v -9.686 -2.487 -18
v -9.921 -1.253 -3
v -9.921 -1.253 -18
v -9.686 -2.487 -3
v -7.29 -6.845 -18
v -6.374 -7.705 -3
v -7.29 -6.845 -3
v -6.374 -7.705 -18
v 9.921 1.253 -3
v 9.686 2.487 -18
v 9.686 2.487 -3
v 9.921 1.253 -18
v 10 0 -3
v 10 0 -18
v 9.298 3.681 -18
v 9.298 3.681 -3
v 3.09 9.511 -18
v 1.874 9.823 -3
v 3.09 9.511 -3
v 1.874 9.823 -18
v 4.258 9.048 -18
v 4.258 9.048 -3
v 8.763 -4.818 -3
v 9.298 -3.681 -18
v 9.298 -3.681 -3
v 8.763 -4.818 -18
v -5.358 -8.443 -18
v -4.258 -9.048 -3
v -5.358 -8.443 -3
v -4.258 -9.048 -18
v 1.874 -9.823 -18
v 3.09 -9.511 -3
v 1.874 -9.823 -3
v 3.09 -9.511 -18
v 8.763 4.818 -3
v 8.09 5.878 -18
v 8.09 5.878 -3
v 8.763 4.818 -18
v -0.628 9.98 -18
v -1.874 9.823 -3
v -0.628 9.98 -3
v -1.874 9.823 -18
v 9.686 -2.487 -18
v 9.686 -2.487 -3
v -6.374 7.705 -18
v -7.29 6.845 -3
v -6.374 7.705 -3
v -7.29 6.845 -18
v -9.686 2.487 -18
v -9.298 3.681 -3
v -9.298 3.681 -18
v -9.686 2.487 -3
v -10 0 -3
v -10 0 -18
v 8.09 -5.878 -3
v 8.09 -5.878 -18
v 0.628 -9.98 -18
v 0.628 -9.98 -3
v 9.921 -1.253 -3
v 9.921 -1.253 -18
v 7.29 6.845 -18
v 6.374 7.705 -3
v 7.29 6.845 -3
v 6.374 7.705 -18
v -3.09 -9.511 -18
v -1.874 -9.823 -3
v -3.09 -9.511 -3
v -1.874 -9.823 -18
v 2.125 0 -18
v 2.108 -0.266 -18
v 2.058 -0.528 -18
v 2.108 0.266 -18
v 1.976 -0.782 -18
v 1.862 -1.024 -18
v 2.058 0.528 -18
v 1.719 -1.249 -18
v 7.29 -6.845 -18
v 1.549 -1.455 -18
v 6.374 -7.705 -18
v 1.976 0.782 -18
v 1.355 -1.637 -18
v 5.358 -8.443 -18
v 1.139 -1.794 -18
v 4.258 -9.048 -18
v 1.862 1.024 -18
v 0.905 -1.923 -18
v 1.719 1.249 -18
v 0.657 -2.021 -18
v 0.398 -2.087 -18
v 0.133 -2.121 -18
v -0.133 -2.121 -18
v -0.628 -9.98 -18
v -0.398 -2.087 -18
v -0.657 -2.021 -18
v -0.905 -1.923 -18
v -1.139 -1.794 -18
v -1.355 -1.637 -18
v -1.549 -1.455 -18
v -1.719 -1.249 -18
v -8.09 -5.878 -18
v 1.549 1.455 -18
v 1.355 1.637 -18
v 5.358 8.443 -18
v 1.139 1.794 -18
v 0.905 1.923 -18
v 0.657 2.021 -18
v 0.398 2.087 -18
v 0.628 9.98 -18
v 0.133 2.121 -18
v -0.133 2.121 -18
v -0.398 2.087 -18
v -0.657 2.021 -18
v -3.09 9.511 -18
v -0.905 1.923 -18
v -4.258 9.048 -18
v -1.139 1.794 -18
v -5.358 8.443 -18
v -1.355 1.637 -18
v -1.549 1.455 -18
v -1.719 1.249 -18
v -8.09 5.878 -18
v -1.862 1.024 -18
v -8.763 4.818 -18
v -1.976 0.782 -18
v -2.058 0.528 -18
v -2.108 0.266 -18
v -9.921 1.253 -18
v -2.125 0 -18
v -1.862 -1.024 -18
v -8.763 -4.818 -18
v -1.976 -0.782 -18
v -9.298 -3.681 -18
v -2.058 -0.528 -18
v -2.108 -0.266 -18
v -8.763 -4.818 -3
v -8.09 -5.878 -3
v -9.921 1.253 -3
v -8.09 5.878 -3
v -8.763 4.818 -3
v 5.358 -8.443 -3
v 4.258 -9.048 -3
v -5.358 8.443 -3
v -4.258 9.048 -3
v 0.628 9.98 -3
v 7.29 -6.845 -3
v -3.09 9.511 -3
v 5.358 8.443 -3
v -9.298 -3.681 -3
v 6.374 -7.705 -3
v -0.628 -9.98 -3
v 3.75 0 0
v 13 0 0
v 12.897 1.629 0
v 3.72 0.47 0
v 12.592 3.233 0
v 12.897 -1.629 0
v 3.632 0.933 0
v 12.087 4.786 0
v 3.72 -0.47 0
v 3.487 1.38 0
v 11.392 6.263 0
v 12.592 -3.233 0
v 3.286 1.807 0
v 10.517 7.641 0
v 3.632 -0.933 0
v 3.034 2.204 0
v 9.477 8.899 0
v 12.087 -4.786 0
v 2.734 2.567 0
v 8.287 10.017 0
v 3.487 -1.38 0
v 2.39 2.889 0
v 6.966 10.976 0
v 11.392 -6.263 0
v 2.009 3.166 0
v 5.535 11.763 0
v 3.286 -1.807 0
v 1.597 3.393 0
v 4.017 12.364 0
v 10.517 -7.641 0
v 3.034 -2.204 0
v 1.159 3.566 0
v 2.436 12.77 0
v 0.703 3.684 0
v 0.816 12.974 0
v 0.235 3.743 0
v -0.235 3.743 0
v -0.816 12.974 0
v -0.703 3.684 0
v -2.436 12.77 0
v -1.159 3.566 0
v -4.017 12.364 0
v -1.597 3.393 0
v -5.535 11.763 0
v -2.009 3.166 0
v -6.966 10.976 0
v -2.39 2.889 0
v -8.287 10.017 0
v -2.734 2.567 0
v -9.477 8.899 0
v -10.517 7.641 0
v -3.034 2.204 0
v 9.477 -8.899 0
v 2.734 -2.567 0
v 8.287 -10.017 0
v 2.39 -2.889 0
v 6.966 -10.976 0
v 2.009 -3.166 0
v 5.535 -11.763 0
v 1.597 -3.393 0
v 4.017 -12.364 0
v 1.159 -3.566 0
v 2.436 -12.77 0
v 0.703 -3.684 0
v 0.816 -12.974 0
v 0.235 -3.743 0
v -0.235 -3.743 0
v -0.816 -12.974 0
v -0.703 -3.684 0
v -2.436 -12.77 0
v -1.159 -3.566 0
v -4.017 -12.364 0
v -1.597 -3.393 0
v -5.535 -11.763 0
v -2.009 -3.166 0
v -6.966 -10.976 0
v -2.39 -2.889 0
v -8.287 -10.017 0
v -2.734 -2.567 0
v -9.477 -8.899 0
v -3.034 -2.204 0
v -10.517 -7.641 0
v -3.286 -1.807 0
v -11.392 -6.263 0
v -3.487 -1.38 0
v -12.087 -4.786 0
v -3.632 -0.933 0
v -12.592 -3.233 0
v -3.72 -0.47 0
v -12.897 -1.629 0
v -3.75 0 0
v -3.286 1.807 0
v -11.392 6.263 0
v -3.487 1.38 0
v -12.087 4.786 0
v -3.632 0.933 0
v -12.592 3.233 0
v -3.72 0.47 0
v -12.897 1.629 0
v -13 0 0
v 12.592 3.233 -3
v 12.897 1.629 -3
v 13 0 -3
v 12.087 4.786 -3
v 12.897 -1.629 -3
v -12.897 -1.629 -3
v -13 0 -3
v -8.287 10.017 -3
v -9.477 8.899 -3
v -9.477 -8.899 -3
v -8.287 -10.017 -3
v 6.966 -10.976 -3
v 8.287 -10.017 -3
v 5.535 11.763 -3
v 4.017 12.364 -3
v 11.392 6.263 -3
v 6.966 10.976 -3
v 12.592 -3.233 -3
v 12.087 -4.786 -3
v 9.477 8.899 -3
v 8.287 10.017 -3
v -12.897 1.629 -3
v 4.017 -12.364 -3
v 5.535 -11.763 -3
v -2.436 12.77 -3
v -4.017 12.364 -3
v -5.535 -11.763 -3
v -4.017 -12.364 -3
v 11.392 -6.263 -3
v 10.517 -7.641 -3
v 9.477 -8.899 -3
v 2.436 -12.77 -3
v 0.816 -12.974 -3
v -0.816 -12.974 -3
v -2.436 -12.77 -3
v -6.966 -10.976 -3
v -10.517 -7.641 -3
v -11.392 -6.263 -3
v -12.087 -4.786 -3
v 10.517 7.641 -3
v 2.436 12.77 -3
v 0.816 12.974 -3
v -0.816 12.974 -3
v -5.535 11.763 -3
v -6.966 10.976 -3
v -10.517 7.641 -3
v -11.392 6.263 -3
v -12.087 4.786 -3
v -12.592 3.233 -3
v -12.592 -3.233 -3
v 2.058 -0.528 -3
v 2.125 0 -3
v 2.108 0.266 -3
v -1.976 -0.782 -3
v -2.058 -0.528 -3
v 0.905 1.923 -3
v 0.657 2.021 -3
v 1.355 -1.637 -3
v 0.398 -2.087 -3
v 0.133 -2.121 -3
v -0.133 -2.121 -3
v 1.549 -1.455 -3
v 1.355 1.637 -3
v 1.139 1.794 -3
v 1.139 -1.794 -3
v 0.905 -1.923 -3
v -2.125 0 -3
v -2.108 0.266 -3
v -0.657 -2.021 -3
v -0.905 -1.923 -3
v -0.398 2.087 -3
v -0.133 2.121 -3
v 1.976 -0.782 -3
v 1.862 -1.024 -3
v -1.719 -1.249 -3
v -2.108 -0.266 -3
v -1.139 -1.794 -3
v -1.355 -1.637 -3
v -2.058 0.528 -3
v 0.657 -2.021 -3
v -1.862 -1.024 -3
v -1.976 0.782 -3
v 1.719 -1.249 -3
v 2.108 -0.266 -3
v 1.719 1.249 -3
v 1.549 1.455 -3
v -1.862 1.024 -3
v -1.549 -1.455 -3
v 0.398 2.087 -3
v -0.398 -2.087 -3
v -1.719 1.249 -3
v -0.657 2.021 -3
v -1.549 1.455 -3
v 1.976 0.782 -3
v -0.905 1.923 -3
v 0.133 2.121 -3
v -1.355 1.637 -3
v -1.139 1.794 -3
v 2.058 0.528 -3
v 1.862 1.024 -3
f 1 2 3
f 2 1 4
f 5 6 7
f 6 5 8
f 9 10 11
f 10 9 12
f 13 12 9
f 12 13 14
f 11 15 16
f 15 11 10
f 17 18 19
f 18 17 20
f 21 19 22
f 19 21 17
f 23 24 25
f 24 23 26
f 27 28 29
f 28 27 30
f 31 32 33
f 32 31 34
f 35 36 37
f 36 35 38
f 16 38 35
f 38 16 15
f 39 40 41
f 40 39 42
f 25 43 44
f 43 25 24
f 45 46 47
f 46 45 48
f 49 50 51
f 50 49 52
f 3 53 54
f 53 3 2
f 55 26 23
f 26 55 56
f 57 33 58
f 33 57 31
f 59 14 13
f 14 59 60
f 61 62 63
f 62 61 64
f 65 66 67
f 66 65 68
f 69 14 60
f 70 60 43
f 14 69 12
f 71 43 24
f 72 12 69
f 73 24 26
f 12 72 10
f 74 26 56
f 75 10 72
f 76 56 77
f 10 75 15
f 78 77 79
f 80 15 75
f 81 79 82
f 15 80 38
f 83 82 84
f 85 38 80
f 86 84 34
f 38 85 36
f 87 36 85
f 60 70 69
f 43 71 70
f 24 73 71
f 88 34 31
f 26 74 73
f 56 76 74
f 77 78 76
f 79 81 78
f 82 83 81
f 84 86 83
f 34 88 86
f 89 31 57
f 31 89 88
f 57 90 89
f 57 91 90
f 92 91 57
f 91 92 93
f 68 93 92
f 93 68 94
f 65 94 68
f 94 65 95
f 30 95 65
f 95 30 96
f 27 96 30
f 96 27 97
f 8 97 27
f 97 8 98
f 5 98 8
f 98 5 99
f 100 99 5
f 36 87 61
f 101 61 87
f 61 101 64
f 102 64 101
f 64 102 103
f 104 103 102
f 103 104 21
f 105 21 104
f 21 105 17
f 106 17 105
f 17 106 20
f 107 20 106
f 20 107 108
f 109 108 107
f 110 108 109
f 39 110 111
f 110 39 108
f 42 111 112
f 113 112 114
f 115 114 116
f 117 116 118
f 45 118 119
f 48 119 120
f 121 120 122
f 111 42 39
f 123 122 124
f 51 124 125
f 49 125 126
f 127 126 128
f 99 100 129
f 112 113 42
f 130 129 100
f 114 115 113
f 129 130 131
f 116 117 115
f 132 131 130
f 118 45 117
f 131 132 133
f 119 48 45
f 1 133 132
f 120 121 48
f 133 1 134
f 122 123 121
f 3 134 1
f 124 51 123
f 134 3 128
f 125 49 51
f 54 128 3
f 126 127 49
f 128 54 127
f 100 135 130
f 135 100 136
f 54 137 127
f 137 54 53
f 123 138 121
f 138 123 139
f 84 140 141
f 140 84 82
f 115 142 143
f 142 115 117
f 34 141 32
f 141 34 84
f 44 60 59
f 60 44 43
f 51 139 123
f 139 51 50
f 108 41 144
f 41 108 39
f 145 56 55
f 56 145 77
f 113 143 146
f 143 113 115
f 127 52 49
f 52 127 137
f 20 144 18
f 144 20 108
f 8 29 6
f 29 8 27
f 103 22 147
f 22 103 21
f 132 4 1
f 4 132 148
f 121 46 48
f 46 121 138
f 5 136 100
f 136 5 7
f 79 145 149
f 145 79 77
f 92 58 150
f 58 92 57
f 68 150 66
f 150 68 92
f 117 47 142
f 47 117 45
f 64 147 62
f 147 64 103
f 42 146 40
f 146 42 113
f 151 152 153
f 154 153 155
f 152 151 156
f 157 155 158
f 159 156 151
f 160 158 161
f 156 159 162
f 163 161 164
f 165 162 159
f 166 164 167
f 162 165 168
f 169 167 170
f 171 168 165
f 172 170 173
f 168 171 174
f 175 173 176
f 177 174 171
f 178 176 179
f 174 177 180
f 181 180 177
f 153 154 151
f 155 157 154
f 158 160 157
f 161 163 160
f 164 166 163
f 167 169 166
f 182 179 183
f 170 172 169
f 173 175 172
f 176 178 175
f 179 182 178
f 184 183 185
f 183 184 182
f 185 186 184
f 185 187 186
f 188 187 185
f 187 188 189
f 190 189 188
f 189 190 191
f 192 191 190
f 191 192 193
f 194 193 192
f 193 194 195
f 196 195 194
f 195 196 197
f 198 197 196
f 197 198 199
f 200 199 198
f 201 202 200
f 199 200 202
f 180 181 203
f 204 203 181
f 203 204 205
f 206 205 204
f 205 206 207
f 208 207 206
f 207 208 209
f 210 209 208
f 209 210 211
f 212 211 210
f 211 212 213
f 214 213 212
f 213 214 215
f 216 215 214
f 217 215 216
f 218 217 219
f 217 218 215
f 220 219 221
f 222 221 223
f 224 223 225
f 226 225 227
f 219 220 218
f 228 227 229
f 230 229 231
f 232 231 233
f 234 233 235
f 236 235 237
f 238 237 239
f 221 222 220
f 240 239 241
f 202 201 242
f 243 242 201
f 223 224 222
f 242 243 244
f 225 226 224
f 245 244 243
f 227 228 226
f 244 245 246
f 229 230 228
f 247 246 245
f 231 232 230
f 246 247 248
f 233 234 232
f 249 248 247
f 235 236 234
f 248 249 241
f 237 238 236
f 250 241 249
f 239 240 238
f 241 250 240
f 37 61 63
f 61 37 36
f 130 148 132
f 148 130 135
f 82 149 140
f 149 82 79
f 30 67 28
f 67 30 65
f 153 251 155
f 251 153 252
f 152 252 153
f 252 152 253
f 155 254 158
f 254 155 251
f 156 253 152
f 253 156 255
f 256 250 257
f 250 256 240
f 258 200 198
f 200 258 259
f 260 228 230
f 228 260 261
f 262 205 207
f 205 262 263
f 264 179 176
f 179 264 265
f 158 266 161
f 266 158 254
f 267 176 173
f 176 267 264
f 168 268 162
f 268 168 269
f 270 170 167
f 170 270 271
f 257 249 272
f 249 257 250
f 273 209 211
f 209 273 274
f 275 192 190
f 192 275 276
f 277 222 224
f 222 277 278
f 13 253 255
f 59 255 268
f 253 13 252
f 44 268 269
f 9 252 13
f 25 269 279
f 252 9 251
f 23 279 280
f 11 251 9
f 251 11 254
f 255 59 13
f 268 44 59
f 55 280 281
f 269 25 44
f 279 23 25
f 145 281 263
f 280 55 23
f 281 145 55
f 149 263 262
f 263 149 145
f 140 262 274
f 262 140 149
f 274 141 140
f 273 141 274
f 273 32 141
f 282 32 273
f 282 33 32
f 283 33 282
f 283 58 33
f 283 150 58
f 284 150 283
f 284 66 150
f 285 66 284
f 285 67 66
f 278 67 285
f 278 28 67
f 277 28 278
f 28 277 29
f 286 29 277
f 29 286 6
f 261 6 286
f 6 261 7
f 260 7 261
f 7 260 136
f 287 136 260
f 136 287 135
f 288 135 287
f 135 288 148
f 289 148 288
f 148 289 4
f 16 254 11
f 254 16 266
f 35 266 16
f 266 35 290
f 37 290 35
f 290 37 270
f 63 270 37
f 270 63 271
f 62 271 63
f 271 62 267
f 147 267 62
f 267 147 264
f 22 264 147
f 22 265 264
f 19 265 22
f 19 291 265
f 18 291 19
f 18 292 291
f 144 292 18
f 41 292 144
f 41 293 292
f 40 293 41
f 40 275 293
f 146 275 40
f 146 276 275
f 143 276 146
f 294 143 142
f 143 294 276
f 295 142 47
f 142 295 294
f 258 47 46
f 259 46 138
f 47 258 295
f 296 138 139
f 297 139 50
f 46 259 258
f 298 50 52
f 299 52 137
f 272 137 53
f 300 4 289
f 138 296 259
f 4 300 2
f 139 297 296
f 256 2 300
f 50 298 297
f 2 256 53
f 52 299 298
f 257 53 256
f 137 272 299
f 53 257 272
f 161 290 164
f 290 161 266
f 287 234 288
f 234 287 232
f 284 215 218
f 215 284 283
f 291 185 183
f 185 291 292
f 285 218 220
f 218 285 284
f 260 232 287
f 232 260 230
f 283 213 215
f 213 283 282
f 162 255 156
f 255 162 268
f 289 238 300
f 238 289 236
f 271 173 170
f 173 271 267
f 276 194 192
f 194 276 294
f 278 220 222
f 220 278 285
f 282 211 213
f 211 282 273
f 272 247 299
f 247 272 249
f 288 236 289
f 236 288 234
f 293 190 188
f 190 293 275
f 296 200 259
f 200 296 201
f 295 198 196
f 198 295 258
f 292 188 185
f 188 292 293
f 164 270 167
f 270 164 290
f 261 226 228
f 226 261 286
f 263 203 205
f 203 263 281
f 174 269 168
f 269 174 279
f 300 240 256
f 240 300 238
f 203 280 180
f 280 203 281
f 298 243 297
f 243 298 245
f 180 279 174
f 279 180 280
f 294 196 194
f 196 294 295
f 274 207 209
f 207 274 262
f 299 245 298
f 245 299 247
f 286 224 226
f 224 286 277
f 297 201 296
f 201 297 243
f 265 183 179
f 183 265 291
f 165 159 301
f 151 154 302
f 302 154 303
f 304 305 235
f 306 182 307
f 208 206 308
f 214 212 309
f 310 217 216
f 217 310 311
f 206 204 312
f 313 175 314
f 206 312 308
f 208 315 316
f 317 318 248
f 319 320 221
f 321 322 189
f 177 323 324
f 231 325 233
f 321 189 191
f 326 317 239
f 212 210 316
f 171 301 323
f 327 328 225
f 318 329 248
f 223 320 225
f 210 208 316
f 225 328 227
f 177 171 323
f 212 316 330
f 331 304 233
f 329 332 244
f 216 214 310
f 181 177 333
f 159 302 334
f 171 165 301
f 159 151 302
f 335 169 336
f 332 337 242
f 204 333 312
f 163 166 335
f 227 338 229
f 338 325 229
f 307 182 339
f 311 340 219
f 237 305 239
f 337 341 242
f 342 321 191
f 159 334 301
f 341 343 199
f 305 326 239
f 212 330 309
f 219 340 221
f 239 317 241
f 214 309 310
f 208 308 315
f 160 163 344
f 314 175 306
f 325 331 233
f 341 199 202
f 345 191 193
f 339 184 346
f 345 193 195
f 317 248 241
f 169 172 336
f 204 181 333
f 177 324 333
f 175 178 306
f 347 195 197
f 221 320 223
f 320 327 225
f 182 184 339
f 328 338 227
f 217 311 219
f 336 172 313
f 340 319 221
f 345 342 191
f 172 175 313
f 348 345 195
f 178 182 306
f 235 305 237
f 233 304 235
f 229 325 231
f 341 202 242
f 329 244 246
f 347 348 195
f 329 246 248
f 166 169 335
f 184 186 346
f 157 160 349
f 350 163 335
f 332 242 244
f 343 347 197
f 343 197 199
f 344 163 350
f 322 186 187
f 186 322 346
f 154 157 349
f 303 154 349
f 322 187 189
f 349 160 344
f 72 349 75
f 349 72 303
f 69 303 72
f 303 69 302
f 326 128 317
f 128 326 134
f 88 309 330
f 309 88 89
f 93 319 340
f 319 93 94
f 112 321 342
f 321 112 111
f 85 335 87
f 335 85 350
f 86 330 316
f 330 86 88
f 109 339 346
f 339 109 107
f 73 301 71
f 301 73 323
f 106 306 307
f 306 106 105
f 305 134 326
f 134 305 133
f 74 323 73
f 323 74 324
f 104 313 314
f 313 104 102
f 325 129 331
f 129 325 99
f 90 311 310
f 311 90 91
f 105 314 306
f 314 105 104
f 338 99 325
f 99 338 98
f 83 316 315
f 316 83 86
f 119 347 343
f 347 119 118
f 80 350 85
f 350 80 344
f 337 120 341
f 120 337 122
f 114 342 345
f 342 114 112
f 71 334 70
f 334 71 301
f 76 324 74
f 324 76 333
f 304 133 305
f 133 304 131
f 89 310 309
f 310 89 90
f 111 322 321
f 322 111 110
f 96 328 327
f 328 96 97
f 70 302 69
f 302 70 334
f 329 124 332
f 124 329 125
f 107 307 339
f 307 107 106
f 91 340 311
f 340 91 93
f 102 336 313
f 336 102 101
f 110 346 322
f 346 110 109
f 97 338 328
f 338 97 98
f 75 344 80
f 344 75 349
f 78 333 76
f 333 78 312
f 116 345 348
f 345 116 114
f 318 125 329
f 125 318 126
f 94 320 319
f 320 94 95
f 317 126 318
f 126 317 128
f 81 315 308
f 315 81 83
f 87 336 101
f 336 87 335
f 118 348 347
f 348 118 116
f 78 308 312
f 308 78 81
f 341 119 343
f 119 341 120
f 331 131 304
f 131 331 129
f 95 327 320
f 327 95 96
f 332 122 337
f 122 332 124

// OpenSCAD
$fn = 50;


difference() {
	union() {
		translate(v = [0, 0, -18.0000000000]) {
			cylinder(h = 18, r = 10.0000000000);
		}
		translate(v = [0, 0, -3.0000000000]) {
			cylinder(h = 3, r = 13.0000000000);
		}
	}
	union() {
		translate(v = [0, 0, 0]) {
			rotate(a = [0, 0, 0]) {
				difference() {
					union() {
						#translate(v = [0, 0, -18.0000000000]) {
							cylinder(h = 18, r = 2.0000000000);
						}
						#translate(v = [0, 0, -3]) {
							cylinder(h = 3, r = 10.0000000000, r1 = 2.1250000000, r2 = 3.7500000000);
						}
						#translate(v = [0, 0, -18.0000000000]) {
							cylinder(h = 18, r = 2.1250000000);
						}
						#translate(v = [0, 0, -18.0000000000]) {
							cylinder(h = 18, r = 2.0000000000);
						}
					}
					union();
				}
			}
		}
	}
}
